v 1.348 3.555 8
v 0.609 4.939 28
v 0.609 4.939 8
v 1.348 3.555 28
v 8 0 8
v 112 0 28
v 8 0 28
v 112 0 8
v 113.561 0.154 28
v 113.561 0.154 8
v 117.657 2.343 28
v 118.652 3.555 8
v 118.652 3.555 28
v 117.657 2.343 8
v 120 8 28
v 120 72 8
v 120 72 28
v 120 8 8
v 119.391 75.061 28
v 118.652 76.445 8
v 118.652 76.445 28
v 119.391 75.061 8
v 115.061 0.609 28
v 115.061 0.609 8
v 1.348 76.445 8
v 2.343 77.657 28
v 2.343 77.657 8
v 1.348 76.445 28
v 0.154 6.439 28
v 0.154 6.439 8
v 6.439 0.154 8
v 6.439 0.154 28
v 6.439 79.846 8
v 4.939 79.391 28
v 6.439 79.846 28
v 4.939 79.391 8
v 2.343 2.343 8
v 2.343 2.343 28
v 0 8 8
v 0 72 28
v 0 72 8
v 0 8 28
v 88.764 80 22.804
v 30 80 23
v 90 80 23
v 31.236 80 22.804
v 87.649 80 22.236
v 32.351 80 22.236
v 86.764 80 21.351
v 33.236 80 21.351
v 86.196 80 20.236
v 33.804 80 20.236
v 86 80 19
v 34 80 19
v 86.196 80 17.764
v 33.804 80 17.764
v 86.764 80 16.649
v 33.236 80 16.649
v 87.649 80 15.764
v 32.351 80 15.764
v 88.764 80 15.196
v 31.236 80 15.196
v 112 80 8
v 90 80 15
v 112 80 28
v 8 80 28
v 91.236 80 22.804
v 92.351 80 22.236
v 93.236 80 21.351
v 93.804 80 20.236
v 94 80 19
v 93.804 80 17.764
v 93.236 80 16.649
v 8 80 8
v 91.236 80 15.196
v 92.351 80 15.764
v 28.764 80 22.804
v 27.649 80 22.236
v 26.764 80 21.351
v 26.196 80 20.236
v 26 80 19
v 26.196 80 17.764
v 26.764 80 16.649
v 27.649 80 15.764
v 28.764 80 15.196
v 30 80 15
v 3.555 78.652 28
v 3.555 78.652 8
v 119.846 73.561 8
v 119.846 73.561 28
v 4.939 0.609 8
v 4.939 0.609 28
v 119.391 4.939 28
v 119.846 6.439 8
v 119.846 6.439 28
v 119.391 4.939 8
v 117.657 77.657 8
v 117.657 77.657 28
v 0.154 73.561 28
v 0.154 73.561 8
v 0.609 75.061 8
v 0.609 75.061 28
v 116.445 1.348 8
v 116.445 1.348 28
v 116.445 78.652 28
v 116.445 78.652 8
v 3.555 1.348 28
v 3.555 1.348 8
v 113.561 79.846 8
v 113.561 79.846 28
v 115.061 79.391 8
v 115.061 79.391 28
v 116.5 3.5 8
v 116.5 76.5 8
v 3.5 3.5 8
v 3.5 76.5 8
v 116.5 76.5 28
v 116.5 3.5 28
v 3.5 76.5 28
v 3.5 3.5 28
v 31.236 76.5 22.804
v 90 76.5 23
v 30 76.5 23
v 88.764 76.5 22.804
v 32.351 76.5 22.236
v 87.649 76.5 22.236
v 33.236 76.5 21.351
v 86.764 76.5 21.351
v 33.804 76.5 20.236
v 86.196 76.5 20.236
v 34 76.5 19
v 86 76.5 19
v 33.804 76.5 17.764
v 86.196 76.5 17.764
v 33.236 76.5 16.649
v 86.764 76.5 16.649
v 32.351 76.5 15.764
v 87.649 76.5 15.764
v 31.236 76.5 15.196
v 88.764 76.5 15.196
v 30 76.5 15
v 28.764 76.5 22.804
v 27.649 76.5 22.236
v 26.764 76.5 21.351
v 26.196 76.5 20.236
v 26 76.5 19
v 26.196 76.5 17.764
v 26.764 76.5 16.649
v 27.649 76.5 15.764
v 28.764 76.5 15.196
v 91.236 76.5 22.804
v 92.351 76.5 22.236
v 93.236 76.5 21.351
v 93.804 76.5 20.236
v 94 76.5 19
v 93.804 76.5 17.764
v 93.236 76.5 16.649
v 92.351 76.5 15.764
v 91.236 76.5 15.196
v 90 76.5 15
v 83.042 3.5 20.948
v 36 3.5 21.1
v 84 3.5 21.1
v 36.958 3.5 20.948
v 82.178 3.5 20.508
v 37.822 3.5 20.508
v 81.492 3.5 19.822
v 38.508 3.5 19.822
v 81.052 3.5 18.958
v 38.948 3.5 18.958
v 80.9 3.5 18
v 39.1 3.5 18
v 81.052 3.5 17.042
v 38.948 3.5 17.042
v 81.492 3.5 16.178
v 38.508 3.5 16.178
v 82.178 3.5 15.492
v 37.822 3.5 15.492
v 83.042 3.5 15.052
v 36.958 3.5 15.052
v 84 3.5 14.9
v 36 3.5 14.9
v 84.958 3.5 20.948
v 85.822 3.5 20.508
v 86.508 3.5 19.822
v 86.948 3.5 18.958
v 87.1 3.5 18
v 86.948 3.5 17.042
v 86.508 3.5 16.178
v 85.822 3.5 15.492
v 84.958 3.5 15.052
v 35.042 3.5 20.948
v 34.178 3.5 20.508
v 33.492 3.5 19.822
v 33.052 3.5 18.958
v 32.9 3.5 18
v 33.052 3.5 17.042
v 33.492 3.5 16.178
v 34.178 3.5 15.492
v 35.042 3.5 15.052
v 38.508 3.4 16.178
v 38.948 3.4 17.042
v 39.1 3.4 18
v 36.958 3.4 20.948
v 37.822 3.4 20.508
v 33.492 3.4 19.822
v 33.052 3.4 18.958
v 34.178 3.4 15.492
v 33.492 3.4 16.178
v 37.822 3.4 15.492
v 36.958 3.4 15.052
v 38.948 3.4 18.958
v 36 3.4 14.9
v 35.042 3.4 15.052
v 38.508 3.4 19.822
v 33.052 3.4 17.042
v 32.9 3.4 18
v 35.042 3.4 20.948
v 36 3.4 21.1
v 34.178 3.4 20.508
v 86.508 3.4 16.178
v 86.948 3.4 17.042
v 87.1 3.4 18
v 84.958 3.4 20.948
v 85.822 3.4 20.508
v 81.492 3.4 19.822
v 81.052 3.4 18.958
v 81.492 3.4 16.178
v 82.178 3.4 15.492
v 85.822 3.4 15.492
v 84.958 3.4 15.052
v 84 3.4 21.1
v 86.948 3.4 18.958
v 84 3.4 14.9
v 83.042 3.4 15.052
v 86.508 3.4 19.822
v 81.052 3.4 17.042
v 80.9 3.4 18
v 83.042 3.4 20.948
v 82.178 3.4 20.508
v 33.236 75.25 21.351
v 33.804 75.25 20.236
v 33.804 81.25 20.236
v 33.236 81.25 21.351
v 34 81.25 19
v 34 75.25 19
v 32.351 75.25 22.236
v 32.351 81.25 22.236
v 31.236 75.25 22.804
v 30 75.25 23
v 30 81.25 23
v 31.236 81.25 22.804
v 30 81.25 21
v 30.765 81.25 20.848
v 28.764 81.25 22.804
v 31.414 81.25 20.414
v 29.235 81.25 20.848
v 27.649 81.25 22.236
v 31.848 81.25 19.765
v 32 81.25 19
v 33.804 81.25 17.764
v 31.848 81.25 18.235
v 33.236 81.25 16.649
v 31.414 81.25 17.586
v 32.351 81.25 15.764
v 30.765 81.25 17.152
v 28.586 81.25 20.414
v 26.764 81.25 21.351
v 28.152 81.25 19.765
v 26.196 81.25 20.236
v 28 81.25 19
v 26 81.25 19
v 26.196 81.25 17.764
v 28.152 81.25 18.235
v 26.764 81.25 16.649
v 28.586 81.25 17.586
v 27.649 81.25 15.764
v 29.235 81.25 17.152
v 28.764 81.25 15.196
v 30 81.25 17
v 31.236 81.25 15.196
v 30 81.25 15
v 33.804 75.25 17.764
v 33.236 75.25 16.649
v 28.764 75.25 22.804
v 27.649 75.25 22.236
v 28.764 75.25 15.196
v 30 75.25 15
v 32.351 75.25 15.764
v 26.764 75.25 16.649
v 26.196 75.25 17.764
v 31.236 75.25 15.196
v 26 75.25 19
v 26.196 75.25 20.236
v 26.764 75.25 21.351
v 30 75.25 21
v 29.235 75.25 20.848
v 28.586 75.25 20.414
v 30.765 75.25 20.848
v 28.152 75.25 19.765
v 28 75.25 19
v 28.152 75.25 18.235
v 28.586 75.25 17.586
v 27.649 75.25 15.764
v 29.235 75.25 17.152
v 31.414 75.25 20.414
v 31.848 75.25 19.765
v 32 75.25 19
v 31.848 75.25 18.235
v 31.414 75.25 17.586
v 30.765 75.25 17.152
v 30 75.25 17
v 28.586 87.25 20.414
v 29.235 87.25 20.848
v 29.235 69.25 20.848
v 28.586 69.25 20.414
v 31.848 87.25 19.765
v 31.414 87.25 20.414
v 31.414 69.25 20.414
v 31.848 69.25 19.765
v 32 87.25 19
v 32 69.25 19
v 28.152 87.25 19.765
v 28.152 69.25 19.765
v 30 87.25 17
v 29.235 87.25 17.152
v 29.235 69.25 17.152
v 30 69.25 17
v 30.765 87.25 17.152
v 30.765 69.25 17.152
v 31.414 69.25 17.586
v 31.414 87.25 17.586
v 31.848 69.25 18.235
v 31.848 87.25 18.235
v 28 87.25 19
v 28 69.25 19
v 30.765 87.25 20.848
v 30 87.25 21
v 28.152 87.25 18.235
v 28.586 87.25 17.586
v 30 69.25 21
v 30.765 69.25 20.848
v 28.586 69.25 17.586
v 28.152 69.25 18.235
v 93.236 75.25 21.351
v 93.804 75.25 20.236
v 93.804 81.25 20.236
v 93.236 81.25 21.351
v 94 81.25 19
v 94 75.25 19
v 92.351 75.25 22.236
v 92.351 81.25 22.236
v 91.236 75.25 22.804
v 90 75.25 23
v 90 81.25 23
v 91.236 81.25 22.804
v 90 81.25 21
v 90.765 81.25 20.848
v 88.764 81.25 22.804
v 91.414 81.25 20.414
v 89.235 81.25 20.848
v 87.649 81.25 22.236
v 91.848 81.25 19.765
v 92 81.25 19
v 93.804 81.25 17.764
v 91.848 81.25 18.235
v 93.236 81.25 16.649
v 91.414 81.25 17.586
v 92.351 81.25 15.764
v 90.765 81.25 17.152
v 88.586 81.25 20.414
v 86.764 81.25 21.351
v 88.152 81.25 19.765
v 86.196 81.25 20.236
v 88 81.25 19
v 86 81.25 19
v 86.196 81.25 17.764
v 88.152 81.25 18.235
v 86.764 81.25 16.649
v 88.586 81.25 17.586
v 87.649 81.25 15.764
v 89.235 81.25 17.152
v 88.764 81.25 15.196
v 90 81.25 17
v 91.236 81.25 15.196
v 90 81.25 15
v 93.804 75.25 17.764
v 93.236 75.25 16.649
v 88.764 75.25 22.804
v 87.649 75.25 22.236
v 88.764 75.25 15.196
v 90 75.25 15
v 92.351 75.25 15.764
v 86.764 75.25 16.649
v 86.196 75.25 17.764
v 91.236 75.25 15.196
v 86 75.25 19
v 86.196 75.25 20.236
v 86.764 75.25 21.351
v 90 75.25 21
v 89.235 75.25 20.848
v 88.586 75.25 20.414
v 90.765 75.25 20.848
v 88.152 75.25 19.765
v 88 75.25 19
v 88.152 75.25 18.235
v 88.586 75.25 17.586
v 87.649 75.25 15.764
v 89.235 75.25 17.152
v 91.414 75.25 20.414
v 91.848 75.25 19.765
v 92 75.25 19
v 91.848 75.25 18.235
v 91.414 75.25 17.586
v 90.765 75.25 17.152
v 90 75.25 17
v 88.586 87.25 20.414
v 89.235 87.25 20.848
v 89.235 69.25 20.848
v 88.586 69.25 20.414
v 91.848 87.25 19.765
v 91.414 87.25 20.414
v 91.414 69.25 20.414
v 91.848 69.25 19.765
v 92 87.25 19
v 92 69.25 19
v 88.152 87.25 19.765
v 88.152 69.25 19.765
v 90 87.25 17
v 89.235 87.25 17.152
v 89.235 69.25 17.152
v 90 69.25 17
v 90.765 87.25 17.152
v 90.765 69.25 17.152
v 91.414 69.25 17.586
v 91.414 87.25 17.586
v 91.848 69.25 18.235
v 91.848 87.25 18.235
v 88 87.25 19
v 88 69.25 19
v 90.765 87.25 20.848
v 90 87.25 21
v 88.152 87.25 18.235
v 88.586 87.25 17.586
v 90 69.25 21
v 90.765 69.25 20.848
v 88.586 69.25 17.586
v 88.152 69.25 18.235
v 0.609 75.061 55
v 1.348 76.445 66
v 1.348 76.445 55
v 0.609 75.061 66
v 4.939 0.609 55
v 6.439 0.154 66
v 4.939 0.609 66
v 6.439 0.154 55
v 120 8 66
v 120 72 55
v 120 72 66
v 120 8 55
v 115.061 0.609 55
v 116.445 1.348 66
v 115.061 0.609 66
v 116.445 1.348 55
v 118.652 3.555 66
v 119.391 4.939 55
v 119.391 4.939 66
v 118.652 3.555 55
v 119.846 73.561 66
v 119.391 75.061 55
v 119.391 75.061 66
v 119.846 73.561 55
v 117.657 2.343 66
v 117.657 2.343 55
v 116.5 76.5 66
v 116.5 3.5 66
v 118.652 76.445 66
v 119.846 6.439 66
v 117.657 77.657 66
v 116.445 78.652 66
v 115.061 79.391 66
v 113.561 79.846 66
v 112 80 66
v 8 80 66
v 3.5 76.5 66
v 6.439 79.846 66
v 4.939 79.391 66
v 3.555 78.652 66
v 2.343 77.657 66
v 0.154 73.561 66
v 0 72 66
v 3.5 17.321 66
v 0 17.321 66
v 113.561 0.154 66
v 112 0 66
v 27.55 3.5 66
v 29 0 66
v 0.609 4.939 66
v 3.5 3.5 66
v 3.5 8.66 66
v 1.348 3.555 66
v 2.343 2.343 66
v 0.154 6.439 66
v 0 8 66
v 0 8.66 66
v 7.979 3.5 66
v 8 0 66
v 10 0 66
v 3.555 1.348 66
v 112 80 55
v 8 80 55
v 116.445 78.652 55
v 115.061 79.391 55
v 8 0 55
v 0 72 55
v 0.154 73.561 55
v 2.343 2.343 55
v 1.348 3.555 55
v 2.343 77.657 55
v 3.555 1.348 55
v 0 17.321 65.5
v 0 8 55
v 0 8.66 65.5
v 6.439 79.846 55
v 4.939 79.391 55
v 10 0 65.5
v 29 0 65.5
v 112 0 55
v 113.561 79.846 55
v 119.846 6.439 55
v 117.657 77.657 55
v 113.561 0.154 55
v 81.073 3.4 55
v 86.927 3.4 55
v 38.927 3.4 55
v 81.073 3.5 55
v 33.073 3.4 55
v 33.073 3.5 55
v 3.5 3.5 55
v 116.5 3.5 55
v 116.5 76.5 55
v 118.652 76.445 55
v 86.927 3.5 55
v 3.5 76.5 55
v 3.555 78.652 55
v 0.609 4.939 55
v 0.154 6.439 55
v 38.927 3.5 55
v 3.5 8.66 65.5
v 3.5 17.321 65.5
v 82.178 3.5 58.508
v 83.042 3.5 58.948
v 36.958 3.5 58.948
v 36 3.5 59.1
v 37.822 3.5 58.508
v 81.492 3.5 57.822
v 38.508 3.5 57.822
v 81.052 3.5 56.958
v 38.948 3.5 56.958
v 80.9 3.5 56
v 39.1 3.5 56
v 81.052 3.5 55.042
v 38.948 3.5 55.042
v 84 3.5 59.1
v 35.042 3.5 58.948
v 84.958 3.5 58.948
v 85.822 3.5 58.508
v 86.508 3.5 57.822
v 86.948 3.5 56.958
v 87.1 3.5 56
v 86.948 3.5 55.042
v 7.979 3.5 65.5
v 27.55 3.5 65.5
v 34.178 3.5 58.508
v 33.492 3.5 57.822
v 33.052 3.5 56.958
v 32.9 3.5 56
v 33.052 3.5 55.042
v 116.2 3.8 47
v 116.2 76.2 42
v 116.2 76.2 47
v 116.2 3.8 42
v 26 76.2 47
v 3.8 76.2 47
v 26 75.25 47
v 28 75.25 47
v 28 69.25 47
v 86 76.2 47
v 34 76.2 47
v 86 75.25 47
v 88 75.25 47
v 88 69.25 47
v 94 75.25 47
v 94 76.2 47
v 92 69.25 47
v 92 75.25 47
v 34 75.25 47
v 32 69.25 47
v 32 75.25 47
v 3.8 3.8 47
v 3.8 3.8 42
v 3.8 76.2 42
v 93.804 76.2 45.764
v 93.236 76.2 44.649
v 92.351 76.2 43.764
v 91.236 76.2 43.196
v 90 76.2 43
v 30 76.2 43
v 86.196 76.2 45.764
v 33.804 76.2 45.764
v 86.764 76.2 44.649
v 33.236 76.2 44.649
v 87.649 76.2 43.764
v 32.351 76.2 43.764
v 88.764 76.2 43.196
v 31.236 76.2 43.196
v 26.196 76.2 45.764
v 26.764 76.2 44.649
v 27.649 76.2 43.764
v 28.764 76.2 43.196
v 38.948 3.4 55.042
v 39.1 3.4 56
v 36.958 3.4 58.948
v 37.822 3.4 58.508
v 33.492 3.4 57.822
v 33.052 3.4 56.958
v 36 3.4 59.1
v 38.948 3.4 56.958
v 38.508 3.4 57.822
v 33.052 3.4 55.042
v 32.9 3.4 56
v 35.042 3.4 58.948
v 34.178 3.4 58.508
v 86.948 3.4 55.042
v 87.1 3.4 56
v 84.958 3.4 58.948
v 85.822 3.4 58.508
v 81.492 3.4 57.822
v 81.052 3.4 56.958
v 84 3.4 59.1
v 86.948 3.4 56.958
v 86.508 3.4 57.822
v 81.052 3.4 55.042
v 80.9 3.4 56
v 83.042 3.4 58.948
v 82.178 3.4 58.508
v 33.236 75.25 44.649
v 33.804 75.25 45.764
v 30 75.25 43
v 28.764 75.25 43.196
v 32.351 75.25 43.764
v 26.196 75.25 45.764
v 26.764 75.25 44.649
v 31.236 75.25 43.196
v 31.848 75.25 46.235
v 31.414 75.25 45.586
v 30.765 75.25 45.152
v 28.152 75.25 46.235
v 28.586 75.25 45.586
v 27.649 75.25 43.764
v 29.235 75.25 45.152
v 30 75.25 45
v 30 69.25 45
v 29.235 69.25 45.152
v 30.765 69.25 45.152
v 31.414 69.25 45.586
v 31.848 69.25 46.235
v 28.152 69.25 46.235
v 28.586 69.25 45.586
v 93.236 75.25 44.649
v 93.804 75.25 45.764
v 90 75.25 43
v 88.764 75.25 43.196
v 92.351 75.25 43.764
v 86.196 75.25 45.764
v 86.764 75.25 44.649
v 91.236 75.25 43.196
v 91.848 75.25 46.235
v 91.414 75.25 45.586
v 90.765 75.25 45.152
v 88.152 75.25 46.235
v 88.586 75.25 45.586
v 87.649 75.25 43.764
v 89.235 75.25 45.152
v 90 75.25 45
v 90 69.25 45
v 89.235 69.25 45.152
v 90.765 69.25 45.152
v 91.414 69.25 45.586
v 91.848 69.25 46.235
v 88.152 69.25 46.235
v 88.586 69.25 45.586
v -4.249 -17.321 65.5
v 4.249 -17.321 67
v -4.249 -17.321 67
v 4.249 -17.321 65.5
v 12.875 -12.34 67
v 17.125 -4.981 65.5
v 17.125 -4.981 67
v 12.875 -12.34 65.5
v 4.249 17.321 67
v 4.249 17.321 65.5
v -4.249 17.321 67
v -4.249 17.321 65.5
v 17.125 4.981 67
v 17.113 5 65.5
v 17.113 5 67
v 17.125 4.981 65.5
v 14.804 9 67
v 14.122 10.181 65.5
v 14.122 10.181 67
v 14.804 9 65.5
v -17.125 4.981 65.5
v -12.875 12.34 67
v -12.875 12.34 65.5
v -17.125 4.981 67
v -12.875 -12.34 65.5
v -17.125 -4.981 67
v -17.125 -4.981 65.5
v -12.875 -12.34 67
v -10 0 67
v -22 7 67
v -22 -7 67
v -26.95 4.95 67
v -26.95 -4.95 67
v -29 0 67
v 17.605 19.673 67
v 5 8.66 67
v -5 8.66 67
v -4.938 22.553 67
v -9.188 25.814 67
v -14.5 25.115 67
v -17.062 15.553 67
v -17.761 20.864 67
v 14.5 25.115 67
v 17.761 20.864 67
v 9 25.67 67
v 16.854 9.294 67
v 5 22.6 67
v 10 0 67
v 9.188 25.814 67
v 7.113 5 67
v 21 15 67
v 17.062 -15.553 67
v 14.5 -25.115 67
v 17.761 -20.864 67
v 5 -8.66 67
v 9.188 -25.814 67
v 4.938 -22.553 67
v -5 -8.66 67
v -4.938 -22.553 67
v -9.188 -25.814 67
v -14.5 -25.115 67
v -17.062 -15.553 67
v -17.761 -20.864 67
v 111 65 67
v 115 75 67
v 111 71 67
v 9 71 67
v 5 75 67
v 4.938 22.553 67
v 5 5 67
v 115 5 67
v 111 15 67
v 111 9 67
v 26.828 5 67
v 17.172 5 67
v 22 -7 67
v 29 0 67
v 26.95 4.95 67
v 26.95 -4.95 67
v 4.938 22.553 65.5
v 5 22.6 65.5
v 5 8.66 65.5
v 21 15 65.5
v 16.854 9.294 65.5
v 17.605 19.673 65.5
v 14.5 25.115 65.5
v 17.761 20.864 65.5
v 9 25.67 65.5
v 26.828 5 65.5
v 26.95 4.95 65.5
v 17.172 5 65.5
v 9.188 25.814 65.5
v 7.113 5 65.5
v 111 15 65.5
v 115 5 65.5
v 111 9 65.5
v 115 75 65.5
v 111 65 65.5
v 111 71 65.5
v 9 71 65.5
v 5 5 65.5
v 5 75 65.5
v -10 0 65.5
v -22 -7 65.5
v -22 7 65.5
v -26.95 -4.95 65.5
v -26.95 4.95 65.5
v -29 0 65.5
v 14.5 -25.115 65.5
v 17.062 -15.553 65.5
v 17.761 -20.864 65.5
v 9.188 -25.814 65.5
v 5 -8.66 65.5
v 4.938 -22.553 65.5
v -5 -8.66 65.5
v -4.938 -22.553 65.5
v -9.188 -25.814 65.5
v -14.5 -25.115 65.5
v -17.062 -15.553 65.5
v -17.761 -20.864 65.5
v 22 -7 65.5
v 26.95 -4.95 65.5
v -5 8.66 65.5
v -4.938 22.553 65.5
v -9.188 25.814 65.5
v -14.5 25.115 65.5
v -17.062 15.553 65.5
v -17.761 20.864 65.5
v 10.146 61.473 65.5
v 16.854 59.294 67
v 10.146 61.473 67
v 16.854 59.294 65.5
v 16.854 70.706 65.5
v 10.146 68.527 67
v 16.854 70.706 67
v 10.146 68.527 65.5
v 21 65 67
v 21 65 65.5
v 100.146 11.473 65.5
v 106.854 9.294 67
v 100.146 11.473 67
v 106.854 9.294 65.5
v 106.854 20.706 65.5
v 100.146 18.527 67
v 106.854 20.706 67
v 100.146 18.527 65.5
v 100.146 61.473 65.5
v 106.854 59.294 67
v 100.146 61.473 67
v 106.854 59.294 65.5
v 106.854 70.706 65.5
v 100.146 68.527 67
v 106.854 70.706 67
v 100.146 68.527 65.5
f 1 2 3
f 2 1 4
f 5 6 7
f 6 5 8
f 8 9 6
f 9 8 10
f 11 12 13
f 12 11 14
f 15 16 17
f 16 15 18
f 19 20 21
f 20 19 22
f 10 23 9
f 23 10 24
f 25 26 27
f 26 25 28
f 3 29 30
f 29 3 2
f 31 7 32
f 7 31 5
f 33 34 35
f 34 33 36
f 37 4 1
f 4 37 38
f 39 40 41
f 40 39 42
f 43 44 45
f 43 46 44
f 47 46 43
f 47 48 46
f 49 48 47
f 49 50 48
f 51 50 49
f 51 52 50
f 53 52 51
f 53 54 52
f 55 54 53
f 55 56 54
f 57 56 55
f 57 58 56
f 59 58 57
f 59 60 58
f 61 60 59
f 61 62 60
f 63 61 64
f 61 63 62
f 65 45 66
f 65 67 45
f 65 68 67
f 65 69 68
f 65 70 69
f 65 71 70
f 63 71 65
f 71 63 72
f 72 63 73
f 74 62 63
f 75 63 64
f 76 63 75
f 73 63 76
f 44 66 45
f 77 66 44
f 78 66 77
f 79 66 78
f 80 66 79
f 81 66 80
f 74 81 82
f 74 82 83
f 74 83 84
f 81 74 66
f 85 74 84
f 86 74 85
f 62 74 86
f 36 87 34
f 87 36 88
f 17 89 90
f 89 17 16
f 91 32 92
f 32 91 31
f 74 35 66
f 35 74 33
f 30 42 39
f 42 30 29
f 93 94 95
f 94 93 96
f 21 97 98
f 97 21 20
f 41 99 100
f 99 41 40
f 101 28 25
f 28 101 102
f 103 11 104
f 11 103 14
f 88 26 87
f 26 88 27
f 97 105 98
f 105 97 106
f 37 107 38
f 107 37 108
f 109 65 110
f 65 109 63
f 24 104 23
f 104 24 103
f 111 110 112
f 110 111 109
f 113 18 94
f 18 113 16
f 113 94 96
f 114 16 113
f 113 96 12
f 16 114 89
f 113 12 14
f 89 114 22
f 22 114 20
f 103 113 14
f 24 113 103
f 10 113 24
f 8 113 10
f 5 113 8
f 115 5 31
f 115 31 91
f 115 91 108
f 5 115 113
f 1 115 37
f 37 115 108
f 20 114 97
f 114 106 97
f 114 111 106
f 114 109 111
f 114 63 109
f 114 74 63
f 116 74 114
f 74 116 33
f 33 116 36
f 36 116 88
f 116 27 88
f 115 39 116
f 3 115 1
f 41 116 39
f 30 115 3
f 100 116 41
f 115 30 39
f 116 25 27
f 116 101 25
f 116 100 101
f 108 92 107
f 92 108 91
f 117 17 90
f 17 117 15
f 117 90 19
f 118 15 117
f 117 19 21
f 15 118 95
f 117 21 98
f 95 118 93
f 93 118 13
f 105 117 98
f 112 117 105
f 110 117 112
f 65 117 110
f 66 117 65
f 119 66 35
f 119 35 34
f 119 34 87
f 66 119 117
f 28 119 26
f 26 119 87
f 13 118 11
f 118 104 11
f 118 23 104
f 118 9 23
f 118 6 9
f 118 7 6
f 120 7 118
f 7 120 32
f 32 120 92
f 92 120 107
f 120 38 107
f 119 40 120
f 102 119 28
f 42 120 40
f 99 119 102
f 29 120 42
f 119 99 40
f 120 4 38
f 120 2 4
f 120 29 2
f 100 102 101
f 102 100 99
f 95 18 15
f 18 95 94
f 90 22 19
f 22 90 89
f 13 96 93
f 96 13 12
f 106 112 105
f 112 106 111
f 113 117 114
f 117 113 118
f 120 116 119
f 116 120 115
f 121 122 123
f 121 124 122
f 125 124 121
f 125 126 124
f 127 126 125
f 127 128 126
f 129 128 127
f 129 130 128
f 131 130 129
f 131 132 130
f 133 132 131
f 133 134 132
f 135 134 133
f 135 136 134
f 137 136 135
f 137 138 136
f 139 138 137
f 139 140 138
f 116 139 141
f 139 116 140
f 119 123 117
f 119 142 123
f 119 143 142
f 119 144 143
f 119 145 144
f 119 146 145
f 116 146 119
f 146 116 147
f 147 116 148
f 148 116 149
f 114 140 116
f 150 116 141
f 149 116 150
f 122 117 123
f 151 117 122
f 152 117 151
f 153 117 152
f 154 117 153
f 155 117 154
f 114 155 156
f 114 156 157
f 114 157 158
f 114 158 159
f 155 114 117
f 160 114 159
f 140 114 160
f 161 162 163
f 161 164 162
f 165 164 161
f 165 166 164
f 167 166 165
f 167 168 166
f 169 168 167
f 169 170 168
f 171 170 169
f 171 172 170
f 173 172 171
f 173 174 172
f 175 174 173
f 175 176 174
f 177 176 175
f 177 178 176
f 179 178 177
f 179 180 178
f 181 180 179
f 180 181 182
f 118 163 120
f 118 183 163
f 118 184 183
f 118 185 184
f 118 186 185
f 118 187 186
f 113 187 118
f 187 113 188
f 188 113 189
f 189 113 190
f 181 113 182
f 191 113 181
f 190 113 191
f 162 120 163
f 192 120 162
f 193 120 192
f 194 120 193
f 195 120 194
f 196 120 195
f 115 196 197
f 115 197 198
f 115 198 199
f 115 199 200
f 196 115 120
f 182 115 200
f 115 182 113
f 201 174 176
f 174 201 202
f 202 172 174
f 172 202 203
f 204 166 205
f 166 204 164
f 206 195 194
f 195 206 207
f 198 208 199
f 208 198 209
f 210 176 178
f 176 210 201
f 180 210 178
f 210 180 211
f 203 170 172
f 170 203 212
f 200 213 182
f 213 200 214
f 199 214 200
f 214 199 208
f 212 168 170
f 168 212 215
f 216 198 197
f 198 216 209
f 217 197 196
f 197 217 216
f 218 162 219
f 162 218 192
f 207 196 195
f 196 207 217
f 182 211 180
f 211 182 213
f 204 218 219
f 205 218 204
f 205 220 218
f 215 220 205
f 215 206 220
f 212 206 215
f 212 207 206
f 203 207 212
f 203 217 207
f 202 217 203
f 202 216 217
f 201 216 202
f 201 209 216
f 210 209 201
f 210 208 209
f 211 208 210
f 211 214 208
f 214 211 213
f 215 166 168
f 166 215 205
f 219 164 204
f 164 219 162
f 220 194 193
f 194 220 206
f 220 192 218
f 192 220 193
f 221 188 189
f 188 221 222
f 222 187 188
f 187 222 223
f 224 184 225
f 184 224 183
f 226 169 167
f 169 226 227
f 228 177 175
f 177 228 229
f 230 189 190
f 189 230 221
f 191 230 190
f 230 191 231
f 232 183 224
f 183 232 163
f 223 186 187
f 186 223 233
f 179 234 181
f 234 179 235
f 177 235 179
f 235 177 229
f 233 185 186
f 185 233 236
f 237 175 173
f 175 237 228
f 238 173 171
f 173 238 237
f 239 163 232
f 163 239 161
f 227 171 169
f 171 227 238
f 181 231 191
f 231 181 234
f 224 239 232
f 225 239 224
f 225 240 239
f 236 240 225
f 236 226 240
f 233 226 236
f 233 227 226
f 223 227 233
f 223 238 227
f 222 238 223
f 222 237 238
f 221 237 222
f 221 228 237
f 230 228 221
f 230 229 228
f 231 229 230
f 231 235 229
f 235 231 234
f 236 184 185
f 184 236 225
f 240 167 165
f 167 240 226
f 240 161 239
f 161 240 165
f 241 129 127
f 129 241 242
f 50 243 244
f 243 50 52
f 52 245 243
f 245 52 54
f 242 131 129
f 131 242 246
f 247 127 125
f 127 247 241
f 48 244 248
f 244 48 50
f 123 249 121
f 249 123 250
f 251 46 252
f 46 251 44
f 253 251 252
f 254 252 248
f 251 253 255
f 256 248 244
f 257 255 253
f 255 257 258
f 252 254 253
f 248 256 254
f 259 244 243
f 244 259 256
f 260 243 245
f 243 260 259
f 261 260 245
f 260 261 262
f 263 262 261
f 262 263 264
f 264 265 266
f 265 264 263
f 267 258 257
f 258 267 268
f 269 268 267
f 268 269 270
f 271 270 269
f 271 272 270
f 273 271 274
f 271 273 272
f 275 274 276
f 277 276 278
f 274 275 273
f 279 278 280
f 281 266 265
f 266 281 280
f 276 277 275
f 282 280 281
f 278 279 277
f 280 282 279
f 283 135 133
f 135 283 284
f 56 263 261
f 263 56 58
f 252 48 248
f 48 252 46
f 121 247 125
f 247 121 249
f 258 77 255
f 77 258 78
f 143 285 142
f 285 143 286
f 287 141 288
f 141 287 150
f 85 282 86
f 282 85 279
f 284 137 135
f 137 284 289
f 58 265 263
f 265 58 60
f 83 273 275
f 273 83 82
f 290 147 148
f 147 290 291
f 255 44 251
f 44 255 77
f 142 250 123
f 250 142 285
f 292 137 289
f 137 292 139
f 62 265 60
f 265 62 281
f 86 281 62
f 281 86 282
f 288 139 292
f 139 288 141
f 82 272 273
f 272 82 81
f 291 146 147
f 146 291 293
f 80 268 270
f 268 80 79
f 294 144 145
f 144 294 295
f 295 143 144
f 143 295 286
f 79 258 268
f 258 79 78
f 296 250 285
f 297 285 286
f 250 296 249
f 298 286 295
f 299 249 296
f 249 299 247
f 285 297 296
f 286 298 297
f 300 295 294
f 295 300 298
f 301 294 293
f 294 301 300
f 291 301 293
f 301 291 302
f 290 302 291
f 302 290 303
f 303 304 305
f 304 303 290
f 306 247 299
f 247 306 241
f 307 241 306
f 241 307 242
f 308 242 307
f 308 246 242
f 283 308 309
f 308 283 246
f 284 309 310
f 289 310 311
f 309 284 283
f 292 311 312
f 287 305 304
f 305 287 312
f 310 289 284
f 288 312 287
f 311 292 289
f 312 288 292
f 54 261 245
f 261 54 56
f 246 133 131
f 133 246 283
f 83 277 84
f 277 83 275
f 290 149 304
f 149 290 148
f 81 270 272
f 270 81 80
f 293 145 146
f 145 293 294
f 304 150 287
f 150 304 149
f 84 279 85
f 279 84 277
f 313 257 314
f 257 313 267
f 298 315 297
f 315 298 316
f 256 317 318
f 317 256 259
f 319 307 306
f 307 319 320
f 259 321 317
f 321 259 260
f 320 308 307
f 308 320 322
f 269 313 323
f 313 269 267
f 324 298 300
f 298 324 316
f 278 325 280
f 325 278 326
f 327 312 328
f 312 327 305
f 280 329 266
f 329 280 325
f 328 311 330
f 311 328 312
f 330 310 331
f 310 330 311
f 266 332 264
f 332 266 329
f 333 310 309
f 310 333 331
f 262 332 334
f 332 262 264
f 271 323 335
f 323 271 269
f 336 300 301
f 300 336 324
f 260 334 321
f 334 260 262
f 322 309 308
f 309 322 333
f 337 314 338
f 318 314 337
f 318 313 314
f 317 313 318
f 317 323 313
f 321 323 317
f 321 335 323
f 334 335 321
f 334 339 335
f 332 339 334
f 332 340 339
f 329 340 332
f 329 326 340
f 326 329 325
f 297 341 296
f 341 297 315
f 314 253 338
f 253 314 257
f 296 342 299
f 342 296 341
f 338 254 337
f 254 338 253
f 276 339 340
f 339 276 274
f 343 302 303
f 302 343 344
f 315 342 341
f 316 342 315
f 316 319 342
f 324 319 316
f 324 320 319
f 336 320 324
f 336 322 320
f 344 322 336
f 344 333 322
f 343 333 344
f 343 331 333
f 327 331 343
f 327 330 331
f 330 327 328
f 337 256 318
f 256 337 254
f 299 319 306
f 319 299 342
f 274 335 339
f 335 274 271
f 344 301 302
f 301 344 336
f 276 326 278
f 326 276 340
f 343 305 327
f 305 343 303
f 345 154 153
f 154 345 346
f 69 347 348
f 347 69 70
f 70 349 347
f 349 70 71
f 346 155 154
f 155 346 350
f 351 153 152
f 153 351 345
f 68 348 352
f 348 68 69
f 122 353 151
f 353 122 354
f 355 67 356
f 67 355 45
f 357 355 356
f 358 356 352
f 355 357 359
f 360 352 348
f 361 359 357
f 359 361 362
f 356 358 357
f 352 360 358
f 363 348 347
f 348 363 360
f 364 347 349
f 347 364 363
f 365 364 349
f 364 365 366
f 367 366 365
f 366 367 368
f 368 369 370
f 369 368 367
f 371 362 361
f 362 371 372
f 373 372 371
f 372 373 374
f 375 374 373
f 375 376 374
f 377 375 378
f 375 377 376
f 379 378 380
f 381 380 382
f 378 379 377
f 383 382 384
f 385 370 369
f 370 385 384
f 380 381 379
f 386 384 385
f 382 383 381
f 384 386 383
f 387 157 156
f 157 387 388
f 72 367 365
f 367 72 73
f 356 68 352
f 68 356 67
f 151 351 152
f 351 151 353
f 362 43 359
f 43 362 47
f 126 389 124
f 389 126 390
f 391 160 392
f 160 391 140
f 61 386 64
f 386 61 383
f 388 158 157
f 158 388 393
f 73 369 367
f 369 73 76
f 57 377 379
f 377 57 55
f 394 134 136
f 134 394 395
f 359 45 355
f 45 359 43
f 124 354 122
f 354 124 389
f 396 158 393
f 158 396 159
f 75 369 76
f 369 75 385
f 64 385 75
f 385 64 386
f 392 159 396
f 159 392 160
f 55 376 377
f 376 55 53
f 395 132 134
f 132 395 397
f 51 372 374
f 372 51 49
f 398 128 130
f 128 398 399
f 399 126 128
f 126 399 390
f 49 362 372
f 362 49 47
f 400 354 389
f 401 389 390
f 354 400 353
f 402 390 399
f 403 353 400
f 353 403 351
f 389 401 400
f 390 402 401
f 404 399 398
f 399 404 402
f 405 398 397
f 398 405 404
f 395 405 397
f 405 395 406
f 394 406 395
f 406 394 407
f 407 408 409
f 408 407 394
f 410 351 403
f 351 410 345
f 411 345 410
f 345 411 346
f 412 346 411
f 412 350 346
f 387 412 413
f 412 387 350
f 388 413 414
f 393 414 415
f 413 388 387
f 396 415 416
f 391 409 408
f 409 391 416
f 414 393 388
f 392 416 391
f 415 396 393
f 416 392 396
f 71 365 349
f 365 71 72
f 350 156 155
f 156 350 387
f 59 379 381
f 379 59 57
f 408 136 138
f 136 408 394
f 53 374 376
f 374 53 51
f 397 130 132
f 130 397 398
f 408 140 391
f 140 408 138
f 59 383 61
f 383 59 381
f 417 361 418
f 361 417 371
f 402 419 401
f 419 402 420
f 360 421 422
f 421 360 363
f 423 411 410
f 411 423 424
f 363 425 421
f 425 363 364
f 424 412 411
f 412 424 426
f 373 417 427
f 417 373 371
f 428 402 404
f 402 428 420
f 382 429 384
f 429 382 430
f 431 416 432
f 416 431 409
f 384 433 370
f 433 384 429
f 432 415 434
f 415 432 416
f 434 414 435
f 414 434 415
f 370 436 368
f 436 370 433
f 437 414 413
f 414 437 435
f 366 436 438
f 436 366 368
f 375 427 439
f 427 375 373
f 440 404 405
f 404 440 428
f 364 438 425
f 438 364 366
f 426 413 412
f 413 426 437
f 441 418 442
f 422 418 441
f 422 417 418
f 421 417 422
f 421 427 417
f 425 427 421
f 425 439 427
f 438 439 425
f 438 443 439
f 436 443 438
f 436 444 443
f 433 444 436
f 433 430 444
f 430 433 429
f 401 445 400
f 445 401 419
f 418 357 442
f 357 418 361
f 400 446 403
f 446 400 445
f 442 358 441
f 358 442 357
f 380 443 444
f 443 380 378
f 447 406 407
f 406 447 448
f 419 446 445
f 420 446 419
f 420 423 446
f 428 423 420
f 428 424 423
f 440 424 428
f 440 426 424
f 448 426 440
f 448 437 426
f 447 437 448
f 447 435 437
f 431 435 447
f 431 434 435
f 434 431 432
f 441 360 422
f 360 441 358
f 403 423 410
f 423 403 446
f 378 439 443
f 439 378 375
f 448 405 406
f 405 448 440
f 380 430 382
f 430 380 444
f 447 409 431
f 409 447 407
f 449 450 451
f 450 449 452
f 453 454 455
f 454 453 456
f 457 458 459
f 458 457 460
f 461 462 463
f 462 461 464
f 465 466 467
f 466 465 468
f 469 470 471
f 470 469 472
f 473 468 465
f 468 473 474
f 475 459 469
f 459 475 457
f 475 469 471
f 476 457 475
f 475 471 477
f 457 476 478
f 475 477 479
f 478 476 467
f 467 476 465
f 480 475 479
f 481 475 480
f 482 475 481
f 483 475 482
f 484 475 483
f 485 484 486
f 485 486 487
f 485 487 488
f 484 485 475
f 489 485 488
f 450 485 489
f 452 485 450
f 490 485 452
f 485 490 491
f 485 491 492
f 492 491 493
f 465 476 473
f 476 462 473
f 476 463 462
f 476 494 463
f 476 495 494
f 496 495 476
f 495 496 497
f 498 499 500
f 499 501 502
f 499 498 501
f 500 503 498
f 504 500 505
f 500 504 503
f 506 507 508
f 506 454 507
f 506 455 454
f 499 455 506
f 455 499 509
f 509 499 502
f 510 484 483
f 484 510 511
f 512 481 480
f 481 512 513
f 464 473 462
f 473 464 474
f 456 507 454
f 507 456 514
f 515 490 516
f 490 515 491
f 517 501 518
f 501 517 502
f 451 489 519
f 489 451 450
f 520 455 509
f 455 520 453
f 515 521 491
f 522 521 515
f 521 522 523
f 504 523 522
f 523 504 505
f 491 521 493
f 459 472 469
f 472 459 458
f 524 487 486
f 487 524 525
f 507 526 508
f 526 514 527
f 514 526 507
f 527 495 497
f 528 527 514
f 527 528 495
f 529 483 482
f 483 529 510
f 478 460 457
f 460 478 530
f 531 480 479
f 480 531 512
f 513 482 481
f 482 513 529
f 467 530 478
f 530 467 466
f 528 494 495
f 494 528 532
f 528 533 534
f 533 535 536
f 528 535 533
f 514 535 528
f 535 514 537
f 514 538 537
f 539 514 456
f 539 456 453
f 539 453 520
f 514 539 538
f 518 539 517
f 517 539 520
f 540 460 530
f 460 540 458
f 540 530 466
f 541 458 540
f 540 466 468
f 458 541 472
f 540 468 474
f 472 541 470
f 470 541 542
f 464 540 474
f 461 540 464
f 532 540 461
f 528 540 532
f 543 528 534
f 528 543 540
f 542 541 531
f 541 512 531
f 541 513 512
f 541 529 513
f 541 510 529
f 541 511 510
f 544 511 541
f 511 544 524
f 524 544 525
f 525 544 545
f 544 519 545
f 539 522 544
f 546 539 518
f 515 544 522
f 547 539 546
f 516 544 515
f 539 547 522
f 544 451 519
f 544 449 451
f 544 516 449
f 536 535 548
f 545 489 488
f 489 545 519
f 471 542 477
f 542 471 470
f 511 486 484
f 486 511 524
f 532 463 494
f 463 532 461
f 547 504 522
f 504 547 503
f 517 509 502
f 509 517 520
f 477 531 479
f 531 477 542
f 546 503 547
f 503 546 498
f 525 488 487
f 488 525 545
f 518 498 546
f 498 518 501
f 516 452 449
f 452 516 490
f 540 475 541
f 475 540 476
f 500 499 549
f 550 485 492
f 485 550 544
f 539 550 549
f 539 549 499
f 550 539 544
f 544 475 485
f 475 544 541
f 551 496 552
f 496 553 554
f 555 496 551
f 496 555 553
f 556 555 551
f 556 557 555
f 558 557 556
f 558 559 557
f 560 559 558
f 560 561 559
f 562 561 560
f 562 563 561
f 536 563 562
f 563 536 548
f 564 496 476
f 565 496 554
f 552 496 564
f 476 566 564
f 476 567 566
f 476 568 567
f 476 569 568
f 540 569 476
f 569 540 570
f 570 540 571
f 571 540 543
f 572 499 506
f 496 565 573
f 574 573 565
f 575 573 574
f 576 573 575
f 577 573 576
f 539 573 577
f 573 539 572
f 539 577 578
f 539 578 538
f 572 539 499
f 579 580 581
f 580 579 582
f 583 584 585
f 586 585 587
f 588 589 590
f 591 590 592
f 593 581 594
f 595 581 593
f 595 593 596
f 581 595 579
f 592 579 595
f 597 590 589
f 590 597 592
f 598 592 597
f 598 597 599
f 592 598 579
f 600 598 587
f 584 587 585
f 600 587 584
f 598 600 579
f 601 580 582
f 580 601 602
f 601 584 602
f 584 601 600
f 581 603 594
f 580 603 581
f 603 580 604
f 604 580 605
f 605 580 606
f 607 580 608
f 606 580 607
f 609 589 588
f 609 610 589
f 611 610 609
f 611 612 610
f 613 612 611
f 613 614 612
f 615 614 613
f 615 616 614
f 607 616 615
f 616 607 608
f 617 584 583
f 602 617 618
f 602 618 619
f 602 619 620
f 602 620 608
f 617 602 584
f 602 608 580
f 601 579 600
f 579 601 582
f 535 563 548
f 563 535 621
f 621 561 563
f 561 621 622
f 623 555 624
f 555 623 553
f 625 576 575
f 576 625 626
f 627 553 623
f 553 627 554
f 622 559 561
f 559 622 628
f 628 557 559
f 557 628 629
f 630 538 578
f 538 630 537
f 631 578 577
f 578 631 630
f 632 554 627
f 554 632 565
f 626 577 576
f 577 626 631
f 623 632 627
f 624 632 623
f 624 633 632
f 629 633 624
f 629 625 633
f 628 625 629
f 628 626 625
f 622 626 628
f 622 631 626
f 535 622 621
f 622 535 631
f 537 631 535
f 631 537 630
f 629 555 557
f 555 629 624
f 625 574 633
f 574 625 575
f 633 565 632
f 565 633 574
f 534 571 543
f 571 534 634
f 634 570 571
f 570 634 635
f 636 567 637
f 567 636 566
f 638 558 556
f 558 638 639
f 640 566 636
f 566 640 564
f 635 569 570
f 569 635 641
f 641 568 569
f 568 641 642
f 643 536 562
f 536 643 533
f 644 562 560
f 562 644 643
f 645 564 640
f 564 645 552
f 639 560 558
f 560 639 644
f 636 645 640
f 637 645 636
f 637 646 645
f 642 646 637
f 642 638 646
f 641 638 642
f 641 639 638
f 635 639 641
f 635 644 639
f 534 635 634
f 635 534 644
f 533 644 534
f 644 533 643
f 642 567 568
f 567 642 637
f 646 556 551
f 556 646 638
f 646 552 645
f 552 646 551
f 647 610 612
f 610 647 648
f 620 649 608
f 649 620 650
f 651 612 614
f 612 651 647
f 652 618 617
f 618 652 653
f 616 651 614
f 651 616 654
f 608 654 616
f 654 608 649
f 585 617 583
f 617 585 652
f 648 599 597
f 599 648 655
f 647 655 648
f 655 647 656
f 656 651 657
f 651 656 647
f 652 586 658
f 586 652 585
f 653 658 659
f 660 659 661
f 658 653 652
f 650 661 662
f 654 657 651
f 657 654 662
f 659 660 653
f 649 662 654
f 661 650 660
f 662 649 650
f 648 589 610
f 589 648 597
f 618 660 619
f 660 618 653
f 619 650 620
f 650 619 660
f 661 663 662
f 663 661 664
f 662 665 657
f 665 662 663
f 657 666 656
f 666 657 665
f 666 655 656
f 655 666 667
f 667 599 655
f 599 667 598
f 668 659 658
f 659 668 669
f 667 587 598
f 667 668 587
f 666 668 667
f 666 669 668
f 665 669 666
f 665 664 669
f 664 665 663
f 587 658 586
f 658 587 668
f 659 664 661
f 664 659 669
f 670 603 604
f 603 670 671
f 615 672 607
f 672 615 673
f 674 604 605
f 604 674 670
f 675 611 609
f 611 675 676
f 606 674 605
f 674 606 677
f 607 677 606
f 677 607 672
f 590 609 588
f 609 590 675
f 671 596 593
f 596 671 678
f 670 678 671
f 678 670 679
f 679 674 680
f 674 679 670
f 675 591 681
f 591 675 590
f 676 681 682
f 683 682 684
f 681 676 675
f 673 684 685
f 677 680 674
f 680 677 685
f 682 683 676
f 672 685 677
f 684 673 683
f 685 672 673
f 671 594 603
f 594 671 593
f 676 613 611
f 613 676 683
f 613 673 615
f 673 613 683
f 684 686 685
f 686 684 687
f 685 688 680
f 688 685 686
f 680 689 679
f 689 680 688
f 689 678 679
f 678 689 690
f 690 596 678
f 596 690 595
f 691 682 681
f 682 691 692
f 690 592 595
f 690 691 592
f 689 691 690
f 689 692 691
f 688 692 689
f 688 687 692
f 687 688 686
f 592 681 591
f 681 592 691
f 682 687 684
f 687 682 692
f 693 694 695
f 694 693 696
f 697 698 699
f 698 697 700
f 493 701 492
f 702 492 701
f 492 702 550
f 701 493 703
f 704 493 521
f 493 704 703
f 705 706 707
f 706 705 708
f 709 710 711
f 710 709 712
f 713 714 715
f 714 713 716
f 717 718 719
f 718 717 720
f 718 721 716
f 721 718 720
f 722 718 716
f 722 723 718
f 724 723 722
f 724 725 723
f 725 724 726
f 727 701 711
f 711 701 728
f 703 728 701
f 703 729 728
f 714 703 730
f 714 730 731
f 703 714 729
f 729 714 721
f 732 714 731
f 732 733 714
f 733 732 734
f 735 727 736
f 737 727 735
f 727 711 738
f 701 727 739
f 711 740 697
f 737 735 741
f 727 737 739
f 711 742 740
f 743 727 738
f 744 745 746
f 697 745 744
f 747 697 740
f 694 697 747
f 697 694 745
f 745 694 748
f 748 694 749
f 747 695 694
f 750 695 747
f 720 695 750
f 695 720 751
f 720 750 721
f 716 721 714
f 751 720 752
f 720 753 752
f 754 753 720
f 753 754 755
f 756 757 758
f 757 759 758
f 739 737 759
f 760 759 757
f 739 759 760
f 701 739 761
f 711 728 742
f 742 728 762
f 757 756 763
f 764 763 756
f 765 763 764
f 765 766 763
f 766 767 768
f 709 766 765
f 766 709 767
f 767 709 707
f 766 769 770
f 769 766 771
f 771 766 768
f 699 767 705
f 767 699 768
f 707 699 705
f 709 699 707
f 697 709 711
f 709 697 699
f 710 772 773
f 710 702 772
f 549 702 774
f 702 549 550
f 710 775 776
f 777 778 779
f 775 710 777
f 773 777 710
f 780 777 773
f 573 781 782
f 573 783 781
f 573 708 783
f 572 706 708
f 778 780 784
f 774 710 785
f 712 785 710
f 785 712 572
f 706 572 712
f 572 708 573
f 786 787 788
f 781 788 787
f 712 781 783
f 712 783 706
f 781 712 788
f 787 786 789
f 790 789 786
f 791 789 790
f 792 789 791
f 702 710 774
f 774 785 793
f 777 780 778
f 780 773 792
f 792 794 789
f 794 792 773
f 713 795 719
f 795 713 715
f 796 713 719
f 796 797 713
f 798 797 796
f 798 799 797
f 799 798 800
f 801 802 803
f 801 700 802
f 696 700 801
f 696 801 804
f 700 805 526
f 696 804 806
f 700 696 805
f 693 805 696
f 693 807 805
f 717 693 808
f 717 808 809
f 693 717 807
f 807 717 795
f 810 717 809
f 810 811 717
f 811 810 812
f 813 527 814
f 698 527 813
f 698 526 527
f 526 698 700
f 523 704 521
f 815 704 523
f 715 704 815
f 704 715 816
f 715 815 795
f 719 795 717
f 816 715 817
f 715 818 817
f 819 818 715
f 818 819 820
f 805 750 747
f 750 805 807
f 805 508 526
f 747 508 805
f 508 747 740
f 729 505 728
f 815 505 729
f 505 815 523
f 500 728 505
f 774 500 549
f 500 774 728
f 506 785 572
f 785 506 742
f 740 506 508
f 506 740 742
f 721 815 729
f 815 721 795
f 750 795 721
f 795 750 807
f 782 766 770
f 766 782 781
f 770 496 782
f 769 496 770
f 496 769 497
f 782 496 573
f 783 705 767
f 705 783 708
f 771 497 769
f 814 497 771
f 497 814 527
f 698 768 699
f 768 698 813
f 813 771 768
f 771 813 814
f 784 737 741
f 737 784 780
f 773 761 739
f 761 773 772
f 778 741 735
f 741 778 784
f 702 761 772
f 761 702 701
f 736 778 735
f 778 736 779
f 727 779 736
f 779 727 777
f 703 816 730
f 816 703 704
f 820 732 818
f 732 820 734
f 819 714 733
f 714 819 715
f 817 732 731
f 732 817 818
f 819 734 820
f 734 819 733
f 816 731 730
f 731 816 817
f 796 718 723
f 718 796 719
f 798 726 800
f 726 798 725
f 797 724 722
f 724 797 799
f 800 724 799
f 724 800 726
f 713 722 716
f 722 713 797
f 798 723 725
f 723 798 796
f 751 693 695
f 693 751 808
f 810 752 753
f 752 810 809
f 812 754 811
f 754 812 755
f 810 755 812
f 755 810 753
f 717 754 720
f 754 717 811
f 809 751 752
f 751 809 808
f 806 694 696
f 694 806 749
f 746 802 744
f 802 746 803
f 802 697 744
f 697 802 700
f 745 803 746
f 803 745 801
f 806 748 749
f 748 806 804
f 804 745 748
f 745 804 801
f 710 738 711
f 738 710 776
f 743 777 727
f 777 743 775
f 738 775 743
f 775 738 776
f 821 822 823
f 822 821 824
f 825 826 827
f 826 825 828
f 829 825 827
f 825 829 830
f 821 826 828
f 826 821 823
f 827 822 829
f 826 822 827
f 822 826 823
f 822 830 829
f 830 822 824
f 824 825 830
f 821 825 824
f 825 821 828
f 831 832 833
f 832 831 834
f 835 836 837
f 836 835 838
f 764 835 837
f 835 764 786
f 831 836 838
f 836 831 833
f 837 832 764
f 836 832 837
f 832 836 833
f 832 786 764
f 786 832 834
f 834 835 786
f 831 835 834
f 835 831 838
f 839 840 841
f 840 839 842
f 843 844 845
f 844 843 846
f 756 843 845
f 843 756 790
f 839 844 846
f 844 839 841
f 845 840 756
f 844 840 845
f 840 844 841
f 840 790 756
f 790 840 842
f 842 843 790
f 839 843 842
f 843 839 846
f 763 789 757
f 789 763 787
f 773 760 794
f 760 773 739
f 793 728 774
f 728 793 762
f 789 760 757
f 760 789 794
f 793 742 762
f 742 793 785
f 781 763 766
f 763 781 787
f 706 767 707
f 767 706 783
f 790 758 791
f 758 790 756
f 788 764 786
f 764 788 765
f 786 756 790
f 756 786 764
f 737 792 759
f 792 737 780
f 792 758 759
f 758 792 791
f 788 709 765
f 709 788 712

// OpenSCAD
// Premium Jewelry Box — Hinged Lid, Velvet Inlay Ready
// DUAL COLOR: body (wood-filament PLA) + ornamental overlay (gold PLA)
// P2S: 0.15mm, 4 walls, 15% infill
// Hardware: 2x 6x2mm neodymium magnets (latch), 1x M3 rod hinge

BOX_W  = 120;
BOX_D  = 80;
BOX_H  = 45;
LID_H  = 18;
WALL   = 3.5;
R      = 8;      // Corner radius
MAG_D  = 6.2;    // Magnet pocket diameter
MAG_H  = 2.2;    // Magnet pocket depth
HINGE_D = 4.0;   // Hinge pin hole (M3 bolt)
RING_SLOT_W = 22;
RING_SLOT_D = 12;
RING_SLOTS  = 4;

module rounded_box(w, d, h, r, wall) {
    difference() {
        minkowski() {
            cube([w - r*2, d - r*2, h - r]);
            translate([r, r, r]) cylinder(r = r, h = 1, $fn = 32);
        }
        translate([wall, wall, wall])
            cube([w - wall*2, d - wall*2, h]);
    }
}

module box_body() {
    difference() {
        rounded_box(BOX_W, BOX_D, BOX_H - LID_H, R, WALL);
        // Ring slots (foam insert guides)
        for (i = [0 : RING_SLOTS - 1])
            translate([10 + i * (RING_SLOT_W + 6), BOX_D/2 - RING_SLOT_D/2, BOX_H - LID_H - RING_SLOT_D])
                cube([RING_SLOT_W, RING_SLOT_D, RING_SLOT_D + 1]);
        // Magnet pockets (front)
        for (x = [BOX_W * 0.3, BOX_W * 0.7])
            translate([x, WALL - 0.1, BOX_H * 0.4])
                rotate([-90, 0, 0])
                    cylinder(d = MAG_D, h = MAG_H, $fn = 20);
        // Hinge barrel (back, pair of recesses)
        for (x = [BOX_W * 0.25, BOX_W * 0.75])
            translate([x, BOX_D - WALL, BOX_H - LID_H - 2])
                rotate([90, 0, 0])
                    cylinder(d = HINGE_D + 4, h = WALL * 2, $fn = 20);
    }
    // Hinge knuckles (body side — odd positions)
    for (x = [BOX_W * 0.25, BOX_W * 0.75])
        translate([x, BOX_D - WALL/2, BOX_H - LID_H - 8])
            rotate([90, 0, 0]) {
                cylinder(d = HINGE_D + 4, h = 6, center = true, $fn = 20);
                cylinder(d = HINGE_D, h = 18, center = true, $fn = 16);
            }
}

module lid() {
    translate([0, 0, BOX_H + 2])
    difference() {
        union() {
            rounded_box(BOX_W, BOX_D, LID_H, R, WALL);
            // Lip (fits inside box top)
            translate([WALL + 0.3, WALL + 0.3, -5])
                cube([BOX_W - WALL*2 - 0.6, BOX_D - WALL*2 - 0.6, 5]);
        }
        // Magnet pockets (front)
        for (x = [BOX_W * 0.3, BOX_W * 0.7])
            translate([x, WALL - 0.1, LID_H * 0.5])
                rotate([-90, 0, 0])
                    cylinder(d = MAG_D, h = MAG_H, $fn = 20);
        // Hinge knuckles (lid side)
        for (x = [BOX_W * 0.25, BOX_W * 0.75])
            translate([x, BOX_D - WALL/2, 0])
                rotate([90, 0, 0]) {
                    cylinder(d = HINGE_D + 4, h = 6, center = true, $fn = 20);
                    cylinder(d = HINGE_D, h = 18, center = true, $fn = 16);
                }
    }
}

module ornament_overlay() {
    // Color 2: decorative floral overlay on lid top (AMS)
    translate([0, 0, BOX_H + LID_H + 2.5]) {
        // Central medallion
        difference() {
            cylinder(d = 40, h = 1.5, $fn = 6);
            cylinder(d = 20, h = 2, $fn = 6);
        }
        // Petals
        for (a = [0:60:300])
            rotate([0, 0, a])
                translate([22, 0, 0])
                    cylinder(d = 14, h = 1.5, $fn = 8);
        // Corner flourishes
        for (x = [15, BOX_W - 15], y = [15, BOX_D - 15])
            translate([x - BOX_W/2 + BOX_W/2, y - BOX_D/2 + BOX_D/2, 0])
                cylinder(d = 12, h = 1.5, $fn = 5);
        // Border
        difference() {
            translate([5, 5, 0]) cube([BOX_W - 10, BOX_D - 10, 1.5]);
            translate([9, 9, -1]) cube([BOX_W - 18, BOX_D - 18, 3]);
        }
    }
}

// Color 1: box + lid
box_body();
lid();
// Color 2: ornamental overlay
ornament_overlay();
